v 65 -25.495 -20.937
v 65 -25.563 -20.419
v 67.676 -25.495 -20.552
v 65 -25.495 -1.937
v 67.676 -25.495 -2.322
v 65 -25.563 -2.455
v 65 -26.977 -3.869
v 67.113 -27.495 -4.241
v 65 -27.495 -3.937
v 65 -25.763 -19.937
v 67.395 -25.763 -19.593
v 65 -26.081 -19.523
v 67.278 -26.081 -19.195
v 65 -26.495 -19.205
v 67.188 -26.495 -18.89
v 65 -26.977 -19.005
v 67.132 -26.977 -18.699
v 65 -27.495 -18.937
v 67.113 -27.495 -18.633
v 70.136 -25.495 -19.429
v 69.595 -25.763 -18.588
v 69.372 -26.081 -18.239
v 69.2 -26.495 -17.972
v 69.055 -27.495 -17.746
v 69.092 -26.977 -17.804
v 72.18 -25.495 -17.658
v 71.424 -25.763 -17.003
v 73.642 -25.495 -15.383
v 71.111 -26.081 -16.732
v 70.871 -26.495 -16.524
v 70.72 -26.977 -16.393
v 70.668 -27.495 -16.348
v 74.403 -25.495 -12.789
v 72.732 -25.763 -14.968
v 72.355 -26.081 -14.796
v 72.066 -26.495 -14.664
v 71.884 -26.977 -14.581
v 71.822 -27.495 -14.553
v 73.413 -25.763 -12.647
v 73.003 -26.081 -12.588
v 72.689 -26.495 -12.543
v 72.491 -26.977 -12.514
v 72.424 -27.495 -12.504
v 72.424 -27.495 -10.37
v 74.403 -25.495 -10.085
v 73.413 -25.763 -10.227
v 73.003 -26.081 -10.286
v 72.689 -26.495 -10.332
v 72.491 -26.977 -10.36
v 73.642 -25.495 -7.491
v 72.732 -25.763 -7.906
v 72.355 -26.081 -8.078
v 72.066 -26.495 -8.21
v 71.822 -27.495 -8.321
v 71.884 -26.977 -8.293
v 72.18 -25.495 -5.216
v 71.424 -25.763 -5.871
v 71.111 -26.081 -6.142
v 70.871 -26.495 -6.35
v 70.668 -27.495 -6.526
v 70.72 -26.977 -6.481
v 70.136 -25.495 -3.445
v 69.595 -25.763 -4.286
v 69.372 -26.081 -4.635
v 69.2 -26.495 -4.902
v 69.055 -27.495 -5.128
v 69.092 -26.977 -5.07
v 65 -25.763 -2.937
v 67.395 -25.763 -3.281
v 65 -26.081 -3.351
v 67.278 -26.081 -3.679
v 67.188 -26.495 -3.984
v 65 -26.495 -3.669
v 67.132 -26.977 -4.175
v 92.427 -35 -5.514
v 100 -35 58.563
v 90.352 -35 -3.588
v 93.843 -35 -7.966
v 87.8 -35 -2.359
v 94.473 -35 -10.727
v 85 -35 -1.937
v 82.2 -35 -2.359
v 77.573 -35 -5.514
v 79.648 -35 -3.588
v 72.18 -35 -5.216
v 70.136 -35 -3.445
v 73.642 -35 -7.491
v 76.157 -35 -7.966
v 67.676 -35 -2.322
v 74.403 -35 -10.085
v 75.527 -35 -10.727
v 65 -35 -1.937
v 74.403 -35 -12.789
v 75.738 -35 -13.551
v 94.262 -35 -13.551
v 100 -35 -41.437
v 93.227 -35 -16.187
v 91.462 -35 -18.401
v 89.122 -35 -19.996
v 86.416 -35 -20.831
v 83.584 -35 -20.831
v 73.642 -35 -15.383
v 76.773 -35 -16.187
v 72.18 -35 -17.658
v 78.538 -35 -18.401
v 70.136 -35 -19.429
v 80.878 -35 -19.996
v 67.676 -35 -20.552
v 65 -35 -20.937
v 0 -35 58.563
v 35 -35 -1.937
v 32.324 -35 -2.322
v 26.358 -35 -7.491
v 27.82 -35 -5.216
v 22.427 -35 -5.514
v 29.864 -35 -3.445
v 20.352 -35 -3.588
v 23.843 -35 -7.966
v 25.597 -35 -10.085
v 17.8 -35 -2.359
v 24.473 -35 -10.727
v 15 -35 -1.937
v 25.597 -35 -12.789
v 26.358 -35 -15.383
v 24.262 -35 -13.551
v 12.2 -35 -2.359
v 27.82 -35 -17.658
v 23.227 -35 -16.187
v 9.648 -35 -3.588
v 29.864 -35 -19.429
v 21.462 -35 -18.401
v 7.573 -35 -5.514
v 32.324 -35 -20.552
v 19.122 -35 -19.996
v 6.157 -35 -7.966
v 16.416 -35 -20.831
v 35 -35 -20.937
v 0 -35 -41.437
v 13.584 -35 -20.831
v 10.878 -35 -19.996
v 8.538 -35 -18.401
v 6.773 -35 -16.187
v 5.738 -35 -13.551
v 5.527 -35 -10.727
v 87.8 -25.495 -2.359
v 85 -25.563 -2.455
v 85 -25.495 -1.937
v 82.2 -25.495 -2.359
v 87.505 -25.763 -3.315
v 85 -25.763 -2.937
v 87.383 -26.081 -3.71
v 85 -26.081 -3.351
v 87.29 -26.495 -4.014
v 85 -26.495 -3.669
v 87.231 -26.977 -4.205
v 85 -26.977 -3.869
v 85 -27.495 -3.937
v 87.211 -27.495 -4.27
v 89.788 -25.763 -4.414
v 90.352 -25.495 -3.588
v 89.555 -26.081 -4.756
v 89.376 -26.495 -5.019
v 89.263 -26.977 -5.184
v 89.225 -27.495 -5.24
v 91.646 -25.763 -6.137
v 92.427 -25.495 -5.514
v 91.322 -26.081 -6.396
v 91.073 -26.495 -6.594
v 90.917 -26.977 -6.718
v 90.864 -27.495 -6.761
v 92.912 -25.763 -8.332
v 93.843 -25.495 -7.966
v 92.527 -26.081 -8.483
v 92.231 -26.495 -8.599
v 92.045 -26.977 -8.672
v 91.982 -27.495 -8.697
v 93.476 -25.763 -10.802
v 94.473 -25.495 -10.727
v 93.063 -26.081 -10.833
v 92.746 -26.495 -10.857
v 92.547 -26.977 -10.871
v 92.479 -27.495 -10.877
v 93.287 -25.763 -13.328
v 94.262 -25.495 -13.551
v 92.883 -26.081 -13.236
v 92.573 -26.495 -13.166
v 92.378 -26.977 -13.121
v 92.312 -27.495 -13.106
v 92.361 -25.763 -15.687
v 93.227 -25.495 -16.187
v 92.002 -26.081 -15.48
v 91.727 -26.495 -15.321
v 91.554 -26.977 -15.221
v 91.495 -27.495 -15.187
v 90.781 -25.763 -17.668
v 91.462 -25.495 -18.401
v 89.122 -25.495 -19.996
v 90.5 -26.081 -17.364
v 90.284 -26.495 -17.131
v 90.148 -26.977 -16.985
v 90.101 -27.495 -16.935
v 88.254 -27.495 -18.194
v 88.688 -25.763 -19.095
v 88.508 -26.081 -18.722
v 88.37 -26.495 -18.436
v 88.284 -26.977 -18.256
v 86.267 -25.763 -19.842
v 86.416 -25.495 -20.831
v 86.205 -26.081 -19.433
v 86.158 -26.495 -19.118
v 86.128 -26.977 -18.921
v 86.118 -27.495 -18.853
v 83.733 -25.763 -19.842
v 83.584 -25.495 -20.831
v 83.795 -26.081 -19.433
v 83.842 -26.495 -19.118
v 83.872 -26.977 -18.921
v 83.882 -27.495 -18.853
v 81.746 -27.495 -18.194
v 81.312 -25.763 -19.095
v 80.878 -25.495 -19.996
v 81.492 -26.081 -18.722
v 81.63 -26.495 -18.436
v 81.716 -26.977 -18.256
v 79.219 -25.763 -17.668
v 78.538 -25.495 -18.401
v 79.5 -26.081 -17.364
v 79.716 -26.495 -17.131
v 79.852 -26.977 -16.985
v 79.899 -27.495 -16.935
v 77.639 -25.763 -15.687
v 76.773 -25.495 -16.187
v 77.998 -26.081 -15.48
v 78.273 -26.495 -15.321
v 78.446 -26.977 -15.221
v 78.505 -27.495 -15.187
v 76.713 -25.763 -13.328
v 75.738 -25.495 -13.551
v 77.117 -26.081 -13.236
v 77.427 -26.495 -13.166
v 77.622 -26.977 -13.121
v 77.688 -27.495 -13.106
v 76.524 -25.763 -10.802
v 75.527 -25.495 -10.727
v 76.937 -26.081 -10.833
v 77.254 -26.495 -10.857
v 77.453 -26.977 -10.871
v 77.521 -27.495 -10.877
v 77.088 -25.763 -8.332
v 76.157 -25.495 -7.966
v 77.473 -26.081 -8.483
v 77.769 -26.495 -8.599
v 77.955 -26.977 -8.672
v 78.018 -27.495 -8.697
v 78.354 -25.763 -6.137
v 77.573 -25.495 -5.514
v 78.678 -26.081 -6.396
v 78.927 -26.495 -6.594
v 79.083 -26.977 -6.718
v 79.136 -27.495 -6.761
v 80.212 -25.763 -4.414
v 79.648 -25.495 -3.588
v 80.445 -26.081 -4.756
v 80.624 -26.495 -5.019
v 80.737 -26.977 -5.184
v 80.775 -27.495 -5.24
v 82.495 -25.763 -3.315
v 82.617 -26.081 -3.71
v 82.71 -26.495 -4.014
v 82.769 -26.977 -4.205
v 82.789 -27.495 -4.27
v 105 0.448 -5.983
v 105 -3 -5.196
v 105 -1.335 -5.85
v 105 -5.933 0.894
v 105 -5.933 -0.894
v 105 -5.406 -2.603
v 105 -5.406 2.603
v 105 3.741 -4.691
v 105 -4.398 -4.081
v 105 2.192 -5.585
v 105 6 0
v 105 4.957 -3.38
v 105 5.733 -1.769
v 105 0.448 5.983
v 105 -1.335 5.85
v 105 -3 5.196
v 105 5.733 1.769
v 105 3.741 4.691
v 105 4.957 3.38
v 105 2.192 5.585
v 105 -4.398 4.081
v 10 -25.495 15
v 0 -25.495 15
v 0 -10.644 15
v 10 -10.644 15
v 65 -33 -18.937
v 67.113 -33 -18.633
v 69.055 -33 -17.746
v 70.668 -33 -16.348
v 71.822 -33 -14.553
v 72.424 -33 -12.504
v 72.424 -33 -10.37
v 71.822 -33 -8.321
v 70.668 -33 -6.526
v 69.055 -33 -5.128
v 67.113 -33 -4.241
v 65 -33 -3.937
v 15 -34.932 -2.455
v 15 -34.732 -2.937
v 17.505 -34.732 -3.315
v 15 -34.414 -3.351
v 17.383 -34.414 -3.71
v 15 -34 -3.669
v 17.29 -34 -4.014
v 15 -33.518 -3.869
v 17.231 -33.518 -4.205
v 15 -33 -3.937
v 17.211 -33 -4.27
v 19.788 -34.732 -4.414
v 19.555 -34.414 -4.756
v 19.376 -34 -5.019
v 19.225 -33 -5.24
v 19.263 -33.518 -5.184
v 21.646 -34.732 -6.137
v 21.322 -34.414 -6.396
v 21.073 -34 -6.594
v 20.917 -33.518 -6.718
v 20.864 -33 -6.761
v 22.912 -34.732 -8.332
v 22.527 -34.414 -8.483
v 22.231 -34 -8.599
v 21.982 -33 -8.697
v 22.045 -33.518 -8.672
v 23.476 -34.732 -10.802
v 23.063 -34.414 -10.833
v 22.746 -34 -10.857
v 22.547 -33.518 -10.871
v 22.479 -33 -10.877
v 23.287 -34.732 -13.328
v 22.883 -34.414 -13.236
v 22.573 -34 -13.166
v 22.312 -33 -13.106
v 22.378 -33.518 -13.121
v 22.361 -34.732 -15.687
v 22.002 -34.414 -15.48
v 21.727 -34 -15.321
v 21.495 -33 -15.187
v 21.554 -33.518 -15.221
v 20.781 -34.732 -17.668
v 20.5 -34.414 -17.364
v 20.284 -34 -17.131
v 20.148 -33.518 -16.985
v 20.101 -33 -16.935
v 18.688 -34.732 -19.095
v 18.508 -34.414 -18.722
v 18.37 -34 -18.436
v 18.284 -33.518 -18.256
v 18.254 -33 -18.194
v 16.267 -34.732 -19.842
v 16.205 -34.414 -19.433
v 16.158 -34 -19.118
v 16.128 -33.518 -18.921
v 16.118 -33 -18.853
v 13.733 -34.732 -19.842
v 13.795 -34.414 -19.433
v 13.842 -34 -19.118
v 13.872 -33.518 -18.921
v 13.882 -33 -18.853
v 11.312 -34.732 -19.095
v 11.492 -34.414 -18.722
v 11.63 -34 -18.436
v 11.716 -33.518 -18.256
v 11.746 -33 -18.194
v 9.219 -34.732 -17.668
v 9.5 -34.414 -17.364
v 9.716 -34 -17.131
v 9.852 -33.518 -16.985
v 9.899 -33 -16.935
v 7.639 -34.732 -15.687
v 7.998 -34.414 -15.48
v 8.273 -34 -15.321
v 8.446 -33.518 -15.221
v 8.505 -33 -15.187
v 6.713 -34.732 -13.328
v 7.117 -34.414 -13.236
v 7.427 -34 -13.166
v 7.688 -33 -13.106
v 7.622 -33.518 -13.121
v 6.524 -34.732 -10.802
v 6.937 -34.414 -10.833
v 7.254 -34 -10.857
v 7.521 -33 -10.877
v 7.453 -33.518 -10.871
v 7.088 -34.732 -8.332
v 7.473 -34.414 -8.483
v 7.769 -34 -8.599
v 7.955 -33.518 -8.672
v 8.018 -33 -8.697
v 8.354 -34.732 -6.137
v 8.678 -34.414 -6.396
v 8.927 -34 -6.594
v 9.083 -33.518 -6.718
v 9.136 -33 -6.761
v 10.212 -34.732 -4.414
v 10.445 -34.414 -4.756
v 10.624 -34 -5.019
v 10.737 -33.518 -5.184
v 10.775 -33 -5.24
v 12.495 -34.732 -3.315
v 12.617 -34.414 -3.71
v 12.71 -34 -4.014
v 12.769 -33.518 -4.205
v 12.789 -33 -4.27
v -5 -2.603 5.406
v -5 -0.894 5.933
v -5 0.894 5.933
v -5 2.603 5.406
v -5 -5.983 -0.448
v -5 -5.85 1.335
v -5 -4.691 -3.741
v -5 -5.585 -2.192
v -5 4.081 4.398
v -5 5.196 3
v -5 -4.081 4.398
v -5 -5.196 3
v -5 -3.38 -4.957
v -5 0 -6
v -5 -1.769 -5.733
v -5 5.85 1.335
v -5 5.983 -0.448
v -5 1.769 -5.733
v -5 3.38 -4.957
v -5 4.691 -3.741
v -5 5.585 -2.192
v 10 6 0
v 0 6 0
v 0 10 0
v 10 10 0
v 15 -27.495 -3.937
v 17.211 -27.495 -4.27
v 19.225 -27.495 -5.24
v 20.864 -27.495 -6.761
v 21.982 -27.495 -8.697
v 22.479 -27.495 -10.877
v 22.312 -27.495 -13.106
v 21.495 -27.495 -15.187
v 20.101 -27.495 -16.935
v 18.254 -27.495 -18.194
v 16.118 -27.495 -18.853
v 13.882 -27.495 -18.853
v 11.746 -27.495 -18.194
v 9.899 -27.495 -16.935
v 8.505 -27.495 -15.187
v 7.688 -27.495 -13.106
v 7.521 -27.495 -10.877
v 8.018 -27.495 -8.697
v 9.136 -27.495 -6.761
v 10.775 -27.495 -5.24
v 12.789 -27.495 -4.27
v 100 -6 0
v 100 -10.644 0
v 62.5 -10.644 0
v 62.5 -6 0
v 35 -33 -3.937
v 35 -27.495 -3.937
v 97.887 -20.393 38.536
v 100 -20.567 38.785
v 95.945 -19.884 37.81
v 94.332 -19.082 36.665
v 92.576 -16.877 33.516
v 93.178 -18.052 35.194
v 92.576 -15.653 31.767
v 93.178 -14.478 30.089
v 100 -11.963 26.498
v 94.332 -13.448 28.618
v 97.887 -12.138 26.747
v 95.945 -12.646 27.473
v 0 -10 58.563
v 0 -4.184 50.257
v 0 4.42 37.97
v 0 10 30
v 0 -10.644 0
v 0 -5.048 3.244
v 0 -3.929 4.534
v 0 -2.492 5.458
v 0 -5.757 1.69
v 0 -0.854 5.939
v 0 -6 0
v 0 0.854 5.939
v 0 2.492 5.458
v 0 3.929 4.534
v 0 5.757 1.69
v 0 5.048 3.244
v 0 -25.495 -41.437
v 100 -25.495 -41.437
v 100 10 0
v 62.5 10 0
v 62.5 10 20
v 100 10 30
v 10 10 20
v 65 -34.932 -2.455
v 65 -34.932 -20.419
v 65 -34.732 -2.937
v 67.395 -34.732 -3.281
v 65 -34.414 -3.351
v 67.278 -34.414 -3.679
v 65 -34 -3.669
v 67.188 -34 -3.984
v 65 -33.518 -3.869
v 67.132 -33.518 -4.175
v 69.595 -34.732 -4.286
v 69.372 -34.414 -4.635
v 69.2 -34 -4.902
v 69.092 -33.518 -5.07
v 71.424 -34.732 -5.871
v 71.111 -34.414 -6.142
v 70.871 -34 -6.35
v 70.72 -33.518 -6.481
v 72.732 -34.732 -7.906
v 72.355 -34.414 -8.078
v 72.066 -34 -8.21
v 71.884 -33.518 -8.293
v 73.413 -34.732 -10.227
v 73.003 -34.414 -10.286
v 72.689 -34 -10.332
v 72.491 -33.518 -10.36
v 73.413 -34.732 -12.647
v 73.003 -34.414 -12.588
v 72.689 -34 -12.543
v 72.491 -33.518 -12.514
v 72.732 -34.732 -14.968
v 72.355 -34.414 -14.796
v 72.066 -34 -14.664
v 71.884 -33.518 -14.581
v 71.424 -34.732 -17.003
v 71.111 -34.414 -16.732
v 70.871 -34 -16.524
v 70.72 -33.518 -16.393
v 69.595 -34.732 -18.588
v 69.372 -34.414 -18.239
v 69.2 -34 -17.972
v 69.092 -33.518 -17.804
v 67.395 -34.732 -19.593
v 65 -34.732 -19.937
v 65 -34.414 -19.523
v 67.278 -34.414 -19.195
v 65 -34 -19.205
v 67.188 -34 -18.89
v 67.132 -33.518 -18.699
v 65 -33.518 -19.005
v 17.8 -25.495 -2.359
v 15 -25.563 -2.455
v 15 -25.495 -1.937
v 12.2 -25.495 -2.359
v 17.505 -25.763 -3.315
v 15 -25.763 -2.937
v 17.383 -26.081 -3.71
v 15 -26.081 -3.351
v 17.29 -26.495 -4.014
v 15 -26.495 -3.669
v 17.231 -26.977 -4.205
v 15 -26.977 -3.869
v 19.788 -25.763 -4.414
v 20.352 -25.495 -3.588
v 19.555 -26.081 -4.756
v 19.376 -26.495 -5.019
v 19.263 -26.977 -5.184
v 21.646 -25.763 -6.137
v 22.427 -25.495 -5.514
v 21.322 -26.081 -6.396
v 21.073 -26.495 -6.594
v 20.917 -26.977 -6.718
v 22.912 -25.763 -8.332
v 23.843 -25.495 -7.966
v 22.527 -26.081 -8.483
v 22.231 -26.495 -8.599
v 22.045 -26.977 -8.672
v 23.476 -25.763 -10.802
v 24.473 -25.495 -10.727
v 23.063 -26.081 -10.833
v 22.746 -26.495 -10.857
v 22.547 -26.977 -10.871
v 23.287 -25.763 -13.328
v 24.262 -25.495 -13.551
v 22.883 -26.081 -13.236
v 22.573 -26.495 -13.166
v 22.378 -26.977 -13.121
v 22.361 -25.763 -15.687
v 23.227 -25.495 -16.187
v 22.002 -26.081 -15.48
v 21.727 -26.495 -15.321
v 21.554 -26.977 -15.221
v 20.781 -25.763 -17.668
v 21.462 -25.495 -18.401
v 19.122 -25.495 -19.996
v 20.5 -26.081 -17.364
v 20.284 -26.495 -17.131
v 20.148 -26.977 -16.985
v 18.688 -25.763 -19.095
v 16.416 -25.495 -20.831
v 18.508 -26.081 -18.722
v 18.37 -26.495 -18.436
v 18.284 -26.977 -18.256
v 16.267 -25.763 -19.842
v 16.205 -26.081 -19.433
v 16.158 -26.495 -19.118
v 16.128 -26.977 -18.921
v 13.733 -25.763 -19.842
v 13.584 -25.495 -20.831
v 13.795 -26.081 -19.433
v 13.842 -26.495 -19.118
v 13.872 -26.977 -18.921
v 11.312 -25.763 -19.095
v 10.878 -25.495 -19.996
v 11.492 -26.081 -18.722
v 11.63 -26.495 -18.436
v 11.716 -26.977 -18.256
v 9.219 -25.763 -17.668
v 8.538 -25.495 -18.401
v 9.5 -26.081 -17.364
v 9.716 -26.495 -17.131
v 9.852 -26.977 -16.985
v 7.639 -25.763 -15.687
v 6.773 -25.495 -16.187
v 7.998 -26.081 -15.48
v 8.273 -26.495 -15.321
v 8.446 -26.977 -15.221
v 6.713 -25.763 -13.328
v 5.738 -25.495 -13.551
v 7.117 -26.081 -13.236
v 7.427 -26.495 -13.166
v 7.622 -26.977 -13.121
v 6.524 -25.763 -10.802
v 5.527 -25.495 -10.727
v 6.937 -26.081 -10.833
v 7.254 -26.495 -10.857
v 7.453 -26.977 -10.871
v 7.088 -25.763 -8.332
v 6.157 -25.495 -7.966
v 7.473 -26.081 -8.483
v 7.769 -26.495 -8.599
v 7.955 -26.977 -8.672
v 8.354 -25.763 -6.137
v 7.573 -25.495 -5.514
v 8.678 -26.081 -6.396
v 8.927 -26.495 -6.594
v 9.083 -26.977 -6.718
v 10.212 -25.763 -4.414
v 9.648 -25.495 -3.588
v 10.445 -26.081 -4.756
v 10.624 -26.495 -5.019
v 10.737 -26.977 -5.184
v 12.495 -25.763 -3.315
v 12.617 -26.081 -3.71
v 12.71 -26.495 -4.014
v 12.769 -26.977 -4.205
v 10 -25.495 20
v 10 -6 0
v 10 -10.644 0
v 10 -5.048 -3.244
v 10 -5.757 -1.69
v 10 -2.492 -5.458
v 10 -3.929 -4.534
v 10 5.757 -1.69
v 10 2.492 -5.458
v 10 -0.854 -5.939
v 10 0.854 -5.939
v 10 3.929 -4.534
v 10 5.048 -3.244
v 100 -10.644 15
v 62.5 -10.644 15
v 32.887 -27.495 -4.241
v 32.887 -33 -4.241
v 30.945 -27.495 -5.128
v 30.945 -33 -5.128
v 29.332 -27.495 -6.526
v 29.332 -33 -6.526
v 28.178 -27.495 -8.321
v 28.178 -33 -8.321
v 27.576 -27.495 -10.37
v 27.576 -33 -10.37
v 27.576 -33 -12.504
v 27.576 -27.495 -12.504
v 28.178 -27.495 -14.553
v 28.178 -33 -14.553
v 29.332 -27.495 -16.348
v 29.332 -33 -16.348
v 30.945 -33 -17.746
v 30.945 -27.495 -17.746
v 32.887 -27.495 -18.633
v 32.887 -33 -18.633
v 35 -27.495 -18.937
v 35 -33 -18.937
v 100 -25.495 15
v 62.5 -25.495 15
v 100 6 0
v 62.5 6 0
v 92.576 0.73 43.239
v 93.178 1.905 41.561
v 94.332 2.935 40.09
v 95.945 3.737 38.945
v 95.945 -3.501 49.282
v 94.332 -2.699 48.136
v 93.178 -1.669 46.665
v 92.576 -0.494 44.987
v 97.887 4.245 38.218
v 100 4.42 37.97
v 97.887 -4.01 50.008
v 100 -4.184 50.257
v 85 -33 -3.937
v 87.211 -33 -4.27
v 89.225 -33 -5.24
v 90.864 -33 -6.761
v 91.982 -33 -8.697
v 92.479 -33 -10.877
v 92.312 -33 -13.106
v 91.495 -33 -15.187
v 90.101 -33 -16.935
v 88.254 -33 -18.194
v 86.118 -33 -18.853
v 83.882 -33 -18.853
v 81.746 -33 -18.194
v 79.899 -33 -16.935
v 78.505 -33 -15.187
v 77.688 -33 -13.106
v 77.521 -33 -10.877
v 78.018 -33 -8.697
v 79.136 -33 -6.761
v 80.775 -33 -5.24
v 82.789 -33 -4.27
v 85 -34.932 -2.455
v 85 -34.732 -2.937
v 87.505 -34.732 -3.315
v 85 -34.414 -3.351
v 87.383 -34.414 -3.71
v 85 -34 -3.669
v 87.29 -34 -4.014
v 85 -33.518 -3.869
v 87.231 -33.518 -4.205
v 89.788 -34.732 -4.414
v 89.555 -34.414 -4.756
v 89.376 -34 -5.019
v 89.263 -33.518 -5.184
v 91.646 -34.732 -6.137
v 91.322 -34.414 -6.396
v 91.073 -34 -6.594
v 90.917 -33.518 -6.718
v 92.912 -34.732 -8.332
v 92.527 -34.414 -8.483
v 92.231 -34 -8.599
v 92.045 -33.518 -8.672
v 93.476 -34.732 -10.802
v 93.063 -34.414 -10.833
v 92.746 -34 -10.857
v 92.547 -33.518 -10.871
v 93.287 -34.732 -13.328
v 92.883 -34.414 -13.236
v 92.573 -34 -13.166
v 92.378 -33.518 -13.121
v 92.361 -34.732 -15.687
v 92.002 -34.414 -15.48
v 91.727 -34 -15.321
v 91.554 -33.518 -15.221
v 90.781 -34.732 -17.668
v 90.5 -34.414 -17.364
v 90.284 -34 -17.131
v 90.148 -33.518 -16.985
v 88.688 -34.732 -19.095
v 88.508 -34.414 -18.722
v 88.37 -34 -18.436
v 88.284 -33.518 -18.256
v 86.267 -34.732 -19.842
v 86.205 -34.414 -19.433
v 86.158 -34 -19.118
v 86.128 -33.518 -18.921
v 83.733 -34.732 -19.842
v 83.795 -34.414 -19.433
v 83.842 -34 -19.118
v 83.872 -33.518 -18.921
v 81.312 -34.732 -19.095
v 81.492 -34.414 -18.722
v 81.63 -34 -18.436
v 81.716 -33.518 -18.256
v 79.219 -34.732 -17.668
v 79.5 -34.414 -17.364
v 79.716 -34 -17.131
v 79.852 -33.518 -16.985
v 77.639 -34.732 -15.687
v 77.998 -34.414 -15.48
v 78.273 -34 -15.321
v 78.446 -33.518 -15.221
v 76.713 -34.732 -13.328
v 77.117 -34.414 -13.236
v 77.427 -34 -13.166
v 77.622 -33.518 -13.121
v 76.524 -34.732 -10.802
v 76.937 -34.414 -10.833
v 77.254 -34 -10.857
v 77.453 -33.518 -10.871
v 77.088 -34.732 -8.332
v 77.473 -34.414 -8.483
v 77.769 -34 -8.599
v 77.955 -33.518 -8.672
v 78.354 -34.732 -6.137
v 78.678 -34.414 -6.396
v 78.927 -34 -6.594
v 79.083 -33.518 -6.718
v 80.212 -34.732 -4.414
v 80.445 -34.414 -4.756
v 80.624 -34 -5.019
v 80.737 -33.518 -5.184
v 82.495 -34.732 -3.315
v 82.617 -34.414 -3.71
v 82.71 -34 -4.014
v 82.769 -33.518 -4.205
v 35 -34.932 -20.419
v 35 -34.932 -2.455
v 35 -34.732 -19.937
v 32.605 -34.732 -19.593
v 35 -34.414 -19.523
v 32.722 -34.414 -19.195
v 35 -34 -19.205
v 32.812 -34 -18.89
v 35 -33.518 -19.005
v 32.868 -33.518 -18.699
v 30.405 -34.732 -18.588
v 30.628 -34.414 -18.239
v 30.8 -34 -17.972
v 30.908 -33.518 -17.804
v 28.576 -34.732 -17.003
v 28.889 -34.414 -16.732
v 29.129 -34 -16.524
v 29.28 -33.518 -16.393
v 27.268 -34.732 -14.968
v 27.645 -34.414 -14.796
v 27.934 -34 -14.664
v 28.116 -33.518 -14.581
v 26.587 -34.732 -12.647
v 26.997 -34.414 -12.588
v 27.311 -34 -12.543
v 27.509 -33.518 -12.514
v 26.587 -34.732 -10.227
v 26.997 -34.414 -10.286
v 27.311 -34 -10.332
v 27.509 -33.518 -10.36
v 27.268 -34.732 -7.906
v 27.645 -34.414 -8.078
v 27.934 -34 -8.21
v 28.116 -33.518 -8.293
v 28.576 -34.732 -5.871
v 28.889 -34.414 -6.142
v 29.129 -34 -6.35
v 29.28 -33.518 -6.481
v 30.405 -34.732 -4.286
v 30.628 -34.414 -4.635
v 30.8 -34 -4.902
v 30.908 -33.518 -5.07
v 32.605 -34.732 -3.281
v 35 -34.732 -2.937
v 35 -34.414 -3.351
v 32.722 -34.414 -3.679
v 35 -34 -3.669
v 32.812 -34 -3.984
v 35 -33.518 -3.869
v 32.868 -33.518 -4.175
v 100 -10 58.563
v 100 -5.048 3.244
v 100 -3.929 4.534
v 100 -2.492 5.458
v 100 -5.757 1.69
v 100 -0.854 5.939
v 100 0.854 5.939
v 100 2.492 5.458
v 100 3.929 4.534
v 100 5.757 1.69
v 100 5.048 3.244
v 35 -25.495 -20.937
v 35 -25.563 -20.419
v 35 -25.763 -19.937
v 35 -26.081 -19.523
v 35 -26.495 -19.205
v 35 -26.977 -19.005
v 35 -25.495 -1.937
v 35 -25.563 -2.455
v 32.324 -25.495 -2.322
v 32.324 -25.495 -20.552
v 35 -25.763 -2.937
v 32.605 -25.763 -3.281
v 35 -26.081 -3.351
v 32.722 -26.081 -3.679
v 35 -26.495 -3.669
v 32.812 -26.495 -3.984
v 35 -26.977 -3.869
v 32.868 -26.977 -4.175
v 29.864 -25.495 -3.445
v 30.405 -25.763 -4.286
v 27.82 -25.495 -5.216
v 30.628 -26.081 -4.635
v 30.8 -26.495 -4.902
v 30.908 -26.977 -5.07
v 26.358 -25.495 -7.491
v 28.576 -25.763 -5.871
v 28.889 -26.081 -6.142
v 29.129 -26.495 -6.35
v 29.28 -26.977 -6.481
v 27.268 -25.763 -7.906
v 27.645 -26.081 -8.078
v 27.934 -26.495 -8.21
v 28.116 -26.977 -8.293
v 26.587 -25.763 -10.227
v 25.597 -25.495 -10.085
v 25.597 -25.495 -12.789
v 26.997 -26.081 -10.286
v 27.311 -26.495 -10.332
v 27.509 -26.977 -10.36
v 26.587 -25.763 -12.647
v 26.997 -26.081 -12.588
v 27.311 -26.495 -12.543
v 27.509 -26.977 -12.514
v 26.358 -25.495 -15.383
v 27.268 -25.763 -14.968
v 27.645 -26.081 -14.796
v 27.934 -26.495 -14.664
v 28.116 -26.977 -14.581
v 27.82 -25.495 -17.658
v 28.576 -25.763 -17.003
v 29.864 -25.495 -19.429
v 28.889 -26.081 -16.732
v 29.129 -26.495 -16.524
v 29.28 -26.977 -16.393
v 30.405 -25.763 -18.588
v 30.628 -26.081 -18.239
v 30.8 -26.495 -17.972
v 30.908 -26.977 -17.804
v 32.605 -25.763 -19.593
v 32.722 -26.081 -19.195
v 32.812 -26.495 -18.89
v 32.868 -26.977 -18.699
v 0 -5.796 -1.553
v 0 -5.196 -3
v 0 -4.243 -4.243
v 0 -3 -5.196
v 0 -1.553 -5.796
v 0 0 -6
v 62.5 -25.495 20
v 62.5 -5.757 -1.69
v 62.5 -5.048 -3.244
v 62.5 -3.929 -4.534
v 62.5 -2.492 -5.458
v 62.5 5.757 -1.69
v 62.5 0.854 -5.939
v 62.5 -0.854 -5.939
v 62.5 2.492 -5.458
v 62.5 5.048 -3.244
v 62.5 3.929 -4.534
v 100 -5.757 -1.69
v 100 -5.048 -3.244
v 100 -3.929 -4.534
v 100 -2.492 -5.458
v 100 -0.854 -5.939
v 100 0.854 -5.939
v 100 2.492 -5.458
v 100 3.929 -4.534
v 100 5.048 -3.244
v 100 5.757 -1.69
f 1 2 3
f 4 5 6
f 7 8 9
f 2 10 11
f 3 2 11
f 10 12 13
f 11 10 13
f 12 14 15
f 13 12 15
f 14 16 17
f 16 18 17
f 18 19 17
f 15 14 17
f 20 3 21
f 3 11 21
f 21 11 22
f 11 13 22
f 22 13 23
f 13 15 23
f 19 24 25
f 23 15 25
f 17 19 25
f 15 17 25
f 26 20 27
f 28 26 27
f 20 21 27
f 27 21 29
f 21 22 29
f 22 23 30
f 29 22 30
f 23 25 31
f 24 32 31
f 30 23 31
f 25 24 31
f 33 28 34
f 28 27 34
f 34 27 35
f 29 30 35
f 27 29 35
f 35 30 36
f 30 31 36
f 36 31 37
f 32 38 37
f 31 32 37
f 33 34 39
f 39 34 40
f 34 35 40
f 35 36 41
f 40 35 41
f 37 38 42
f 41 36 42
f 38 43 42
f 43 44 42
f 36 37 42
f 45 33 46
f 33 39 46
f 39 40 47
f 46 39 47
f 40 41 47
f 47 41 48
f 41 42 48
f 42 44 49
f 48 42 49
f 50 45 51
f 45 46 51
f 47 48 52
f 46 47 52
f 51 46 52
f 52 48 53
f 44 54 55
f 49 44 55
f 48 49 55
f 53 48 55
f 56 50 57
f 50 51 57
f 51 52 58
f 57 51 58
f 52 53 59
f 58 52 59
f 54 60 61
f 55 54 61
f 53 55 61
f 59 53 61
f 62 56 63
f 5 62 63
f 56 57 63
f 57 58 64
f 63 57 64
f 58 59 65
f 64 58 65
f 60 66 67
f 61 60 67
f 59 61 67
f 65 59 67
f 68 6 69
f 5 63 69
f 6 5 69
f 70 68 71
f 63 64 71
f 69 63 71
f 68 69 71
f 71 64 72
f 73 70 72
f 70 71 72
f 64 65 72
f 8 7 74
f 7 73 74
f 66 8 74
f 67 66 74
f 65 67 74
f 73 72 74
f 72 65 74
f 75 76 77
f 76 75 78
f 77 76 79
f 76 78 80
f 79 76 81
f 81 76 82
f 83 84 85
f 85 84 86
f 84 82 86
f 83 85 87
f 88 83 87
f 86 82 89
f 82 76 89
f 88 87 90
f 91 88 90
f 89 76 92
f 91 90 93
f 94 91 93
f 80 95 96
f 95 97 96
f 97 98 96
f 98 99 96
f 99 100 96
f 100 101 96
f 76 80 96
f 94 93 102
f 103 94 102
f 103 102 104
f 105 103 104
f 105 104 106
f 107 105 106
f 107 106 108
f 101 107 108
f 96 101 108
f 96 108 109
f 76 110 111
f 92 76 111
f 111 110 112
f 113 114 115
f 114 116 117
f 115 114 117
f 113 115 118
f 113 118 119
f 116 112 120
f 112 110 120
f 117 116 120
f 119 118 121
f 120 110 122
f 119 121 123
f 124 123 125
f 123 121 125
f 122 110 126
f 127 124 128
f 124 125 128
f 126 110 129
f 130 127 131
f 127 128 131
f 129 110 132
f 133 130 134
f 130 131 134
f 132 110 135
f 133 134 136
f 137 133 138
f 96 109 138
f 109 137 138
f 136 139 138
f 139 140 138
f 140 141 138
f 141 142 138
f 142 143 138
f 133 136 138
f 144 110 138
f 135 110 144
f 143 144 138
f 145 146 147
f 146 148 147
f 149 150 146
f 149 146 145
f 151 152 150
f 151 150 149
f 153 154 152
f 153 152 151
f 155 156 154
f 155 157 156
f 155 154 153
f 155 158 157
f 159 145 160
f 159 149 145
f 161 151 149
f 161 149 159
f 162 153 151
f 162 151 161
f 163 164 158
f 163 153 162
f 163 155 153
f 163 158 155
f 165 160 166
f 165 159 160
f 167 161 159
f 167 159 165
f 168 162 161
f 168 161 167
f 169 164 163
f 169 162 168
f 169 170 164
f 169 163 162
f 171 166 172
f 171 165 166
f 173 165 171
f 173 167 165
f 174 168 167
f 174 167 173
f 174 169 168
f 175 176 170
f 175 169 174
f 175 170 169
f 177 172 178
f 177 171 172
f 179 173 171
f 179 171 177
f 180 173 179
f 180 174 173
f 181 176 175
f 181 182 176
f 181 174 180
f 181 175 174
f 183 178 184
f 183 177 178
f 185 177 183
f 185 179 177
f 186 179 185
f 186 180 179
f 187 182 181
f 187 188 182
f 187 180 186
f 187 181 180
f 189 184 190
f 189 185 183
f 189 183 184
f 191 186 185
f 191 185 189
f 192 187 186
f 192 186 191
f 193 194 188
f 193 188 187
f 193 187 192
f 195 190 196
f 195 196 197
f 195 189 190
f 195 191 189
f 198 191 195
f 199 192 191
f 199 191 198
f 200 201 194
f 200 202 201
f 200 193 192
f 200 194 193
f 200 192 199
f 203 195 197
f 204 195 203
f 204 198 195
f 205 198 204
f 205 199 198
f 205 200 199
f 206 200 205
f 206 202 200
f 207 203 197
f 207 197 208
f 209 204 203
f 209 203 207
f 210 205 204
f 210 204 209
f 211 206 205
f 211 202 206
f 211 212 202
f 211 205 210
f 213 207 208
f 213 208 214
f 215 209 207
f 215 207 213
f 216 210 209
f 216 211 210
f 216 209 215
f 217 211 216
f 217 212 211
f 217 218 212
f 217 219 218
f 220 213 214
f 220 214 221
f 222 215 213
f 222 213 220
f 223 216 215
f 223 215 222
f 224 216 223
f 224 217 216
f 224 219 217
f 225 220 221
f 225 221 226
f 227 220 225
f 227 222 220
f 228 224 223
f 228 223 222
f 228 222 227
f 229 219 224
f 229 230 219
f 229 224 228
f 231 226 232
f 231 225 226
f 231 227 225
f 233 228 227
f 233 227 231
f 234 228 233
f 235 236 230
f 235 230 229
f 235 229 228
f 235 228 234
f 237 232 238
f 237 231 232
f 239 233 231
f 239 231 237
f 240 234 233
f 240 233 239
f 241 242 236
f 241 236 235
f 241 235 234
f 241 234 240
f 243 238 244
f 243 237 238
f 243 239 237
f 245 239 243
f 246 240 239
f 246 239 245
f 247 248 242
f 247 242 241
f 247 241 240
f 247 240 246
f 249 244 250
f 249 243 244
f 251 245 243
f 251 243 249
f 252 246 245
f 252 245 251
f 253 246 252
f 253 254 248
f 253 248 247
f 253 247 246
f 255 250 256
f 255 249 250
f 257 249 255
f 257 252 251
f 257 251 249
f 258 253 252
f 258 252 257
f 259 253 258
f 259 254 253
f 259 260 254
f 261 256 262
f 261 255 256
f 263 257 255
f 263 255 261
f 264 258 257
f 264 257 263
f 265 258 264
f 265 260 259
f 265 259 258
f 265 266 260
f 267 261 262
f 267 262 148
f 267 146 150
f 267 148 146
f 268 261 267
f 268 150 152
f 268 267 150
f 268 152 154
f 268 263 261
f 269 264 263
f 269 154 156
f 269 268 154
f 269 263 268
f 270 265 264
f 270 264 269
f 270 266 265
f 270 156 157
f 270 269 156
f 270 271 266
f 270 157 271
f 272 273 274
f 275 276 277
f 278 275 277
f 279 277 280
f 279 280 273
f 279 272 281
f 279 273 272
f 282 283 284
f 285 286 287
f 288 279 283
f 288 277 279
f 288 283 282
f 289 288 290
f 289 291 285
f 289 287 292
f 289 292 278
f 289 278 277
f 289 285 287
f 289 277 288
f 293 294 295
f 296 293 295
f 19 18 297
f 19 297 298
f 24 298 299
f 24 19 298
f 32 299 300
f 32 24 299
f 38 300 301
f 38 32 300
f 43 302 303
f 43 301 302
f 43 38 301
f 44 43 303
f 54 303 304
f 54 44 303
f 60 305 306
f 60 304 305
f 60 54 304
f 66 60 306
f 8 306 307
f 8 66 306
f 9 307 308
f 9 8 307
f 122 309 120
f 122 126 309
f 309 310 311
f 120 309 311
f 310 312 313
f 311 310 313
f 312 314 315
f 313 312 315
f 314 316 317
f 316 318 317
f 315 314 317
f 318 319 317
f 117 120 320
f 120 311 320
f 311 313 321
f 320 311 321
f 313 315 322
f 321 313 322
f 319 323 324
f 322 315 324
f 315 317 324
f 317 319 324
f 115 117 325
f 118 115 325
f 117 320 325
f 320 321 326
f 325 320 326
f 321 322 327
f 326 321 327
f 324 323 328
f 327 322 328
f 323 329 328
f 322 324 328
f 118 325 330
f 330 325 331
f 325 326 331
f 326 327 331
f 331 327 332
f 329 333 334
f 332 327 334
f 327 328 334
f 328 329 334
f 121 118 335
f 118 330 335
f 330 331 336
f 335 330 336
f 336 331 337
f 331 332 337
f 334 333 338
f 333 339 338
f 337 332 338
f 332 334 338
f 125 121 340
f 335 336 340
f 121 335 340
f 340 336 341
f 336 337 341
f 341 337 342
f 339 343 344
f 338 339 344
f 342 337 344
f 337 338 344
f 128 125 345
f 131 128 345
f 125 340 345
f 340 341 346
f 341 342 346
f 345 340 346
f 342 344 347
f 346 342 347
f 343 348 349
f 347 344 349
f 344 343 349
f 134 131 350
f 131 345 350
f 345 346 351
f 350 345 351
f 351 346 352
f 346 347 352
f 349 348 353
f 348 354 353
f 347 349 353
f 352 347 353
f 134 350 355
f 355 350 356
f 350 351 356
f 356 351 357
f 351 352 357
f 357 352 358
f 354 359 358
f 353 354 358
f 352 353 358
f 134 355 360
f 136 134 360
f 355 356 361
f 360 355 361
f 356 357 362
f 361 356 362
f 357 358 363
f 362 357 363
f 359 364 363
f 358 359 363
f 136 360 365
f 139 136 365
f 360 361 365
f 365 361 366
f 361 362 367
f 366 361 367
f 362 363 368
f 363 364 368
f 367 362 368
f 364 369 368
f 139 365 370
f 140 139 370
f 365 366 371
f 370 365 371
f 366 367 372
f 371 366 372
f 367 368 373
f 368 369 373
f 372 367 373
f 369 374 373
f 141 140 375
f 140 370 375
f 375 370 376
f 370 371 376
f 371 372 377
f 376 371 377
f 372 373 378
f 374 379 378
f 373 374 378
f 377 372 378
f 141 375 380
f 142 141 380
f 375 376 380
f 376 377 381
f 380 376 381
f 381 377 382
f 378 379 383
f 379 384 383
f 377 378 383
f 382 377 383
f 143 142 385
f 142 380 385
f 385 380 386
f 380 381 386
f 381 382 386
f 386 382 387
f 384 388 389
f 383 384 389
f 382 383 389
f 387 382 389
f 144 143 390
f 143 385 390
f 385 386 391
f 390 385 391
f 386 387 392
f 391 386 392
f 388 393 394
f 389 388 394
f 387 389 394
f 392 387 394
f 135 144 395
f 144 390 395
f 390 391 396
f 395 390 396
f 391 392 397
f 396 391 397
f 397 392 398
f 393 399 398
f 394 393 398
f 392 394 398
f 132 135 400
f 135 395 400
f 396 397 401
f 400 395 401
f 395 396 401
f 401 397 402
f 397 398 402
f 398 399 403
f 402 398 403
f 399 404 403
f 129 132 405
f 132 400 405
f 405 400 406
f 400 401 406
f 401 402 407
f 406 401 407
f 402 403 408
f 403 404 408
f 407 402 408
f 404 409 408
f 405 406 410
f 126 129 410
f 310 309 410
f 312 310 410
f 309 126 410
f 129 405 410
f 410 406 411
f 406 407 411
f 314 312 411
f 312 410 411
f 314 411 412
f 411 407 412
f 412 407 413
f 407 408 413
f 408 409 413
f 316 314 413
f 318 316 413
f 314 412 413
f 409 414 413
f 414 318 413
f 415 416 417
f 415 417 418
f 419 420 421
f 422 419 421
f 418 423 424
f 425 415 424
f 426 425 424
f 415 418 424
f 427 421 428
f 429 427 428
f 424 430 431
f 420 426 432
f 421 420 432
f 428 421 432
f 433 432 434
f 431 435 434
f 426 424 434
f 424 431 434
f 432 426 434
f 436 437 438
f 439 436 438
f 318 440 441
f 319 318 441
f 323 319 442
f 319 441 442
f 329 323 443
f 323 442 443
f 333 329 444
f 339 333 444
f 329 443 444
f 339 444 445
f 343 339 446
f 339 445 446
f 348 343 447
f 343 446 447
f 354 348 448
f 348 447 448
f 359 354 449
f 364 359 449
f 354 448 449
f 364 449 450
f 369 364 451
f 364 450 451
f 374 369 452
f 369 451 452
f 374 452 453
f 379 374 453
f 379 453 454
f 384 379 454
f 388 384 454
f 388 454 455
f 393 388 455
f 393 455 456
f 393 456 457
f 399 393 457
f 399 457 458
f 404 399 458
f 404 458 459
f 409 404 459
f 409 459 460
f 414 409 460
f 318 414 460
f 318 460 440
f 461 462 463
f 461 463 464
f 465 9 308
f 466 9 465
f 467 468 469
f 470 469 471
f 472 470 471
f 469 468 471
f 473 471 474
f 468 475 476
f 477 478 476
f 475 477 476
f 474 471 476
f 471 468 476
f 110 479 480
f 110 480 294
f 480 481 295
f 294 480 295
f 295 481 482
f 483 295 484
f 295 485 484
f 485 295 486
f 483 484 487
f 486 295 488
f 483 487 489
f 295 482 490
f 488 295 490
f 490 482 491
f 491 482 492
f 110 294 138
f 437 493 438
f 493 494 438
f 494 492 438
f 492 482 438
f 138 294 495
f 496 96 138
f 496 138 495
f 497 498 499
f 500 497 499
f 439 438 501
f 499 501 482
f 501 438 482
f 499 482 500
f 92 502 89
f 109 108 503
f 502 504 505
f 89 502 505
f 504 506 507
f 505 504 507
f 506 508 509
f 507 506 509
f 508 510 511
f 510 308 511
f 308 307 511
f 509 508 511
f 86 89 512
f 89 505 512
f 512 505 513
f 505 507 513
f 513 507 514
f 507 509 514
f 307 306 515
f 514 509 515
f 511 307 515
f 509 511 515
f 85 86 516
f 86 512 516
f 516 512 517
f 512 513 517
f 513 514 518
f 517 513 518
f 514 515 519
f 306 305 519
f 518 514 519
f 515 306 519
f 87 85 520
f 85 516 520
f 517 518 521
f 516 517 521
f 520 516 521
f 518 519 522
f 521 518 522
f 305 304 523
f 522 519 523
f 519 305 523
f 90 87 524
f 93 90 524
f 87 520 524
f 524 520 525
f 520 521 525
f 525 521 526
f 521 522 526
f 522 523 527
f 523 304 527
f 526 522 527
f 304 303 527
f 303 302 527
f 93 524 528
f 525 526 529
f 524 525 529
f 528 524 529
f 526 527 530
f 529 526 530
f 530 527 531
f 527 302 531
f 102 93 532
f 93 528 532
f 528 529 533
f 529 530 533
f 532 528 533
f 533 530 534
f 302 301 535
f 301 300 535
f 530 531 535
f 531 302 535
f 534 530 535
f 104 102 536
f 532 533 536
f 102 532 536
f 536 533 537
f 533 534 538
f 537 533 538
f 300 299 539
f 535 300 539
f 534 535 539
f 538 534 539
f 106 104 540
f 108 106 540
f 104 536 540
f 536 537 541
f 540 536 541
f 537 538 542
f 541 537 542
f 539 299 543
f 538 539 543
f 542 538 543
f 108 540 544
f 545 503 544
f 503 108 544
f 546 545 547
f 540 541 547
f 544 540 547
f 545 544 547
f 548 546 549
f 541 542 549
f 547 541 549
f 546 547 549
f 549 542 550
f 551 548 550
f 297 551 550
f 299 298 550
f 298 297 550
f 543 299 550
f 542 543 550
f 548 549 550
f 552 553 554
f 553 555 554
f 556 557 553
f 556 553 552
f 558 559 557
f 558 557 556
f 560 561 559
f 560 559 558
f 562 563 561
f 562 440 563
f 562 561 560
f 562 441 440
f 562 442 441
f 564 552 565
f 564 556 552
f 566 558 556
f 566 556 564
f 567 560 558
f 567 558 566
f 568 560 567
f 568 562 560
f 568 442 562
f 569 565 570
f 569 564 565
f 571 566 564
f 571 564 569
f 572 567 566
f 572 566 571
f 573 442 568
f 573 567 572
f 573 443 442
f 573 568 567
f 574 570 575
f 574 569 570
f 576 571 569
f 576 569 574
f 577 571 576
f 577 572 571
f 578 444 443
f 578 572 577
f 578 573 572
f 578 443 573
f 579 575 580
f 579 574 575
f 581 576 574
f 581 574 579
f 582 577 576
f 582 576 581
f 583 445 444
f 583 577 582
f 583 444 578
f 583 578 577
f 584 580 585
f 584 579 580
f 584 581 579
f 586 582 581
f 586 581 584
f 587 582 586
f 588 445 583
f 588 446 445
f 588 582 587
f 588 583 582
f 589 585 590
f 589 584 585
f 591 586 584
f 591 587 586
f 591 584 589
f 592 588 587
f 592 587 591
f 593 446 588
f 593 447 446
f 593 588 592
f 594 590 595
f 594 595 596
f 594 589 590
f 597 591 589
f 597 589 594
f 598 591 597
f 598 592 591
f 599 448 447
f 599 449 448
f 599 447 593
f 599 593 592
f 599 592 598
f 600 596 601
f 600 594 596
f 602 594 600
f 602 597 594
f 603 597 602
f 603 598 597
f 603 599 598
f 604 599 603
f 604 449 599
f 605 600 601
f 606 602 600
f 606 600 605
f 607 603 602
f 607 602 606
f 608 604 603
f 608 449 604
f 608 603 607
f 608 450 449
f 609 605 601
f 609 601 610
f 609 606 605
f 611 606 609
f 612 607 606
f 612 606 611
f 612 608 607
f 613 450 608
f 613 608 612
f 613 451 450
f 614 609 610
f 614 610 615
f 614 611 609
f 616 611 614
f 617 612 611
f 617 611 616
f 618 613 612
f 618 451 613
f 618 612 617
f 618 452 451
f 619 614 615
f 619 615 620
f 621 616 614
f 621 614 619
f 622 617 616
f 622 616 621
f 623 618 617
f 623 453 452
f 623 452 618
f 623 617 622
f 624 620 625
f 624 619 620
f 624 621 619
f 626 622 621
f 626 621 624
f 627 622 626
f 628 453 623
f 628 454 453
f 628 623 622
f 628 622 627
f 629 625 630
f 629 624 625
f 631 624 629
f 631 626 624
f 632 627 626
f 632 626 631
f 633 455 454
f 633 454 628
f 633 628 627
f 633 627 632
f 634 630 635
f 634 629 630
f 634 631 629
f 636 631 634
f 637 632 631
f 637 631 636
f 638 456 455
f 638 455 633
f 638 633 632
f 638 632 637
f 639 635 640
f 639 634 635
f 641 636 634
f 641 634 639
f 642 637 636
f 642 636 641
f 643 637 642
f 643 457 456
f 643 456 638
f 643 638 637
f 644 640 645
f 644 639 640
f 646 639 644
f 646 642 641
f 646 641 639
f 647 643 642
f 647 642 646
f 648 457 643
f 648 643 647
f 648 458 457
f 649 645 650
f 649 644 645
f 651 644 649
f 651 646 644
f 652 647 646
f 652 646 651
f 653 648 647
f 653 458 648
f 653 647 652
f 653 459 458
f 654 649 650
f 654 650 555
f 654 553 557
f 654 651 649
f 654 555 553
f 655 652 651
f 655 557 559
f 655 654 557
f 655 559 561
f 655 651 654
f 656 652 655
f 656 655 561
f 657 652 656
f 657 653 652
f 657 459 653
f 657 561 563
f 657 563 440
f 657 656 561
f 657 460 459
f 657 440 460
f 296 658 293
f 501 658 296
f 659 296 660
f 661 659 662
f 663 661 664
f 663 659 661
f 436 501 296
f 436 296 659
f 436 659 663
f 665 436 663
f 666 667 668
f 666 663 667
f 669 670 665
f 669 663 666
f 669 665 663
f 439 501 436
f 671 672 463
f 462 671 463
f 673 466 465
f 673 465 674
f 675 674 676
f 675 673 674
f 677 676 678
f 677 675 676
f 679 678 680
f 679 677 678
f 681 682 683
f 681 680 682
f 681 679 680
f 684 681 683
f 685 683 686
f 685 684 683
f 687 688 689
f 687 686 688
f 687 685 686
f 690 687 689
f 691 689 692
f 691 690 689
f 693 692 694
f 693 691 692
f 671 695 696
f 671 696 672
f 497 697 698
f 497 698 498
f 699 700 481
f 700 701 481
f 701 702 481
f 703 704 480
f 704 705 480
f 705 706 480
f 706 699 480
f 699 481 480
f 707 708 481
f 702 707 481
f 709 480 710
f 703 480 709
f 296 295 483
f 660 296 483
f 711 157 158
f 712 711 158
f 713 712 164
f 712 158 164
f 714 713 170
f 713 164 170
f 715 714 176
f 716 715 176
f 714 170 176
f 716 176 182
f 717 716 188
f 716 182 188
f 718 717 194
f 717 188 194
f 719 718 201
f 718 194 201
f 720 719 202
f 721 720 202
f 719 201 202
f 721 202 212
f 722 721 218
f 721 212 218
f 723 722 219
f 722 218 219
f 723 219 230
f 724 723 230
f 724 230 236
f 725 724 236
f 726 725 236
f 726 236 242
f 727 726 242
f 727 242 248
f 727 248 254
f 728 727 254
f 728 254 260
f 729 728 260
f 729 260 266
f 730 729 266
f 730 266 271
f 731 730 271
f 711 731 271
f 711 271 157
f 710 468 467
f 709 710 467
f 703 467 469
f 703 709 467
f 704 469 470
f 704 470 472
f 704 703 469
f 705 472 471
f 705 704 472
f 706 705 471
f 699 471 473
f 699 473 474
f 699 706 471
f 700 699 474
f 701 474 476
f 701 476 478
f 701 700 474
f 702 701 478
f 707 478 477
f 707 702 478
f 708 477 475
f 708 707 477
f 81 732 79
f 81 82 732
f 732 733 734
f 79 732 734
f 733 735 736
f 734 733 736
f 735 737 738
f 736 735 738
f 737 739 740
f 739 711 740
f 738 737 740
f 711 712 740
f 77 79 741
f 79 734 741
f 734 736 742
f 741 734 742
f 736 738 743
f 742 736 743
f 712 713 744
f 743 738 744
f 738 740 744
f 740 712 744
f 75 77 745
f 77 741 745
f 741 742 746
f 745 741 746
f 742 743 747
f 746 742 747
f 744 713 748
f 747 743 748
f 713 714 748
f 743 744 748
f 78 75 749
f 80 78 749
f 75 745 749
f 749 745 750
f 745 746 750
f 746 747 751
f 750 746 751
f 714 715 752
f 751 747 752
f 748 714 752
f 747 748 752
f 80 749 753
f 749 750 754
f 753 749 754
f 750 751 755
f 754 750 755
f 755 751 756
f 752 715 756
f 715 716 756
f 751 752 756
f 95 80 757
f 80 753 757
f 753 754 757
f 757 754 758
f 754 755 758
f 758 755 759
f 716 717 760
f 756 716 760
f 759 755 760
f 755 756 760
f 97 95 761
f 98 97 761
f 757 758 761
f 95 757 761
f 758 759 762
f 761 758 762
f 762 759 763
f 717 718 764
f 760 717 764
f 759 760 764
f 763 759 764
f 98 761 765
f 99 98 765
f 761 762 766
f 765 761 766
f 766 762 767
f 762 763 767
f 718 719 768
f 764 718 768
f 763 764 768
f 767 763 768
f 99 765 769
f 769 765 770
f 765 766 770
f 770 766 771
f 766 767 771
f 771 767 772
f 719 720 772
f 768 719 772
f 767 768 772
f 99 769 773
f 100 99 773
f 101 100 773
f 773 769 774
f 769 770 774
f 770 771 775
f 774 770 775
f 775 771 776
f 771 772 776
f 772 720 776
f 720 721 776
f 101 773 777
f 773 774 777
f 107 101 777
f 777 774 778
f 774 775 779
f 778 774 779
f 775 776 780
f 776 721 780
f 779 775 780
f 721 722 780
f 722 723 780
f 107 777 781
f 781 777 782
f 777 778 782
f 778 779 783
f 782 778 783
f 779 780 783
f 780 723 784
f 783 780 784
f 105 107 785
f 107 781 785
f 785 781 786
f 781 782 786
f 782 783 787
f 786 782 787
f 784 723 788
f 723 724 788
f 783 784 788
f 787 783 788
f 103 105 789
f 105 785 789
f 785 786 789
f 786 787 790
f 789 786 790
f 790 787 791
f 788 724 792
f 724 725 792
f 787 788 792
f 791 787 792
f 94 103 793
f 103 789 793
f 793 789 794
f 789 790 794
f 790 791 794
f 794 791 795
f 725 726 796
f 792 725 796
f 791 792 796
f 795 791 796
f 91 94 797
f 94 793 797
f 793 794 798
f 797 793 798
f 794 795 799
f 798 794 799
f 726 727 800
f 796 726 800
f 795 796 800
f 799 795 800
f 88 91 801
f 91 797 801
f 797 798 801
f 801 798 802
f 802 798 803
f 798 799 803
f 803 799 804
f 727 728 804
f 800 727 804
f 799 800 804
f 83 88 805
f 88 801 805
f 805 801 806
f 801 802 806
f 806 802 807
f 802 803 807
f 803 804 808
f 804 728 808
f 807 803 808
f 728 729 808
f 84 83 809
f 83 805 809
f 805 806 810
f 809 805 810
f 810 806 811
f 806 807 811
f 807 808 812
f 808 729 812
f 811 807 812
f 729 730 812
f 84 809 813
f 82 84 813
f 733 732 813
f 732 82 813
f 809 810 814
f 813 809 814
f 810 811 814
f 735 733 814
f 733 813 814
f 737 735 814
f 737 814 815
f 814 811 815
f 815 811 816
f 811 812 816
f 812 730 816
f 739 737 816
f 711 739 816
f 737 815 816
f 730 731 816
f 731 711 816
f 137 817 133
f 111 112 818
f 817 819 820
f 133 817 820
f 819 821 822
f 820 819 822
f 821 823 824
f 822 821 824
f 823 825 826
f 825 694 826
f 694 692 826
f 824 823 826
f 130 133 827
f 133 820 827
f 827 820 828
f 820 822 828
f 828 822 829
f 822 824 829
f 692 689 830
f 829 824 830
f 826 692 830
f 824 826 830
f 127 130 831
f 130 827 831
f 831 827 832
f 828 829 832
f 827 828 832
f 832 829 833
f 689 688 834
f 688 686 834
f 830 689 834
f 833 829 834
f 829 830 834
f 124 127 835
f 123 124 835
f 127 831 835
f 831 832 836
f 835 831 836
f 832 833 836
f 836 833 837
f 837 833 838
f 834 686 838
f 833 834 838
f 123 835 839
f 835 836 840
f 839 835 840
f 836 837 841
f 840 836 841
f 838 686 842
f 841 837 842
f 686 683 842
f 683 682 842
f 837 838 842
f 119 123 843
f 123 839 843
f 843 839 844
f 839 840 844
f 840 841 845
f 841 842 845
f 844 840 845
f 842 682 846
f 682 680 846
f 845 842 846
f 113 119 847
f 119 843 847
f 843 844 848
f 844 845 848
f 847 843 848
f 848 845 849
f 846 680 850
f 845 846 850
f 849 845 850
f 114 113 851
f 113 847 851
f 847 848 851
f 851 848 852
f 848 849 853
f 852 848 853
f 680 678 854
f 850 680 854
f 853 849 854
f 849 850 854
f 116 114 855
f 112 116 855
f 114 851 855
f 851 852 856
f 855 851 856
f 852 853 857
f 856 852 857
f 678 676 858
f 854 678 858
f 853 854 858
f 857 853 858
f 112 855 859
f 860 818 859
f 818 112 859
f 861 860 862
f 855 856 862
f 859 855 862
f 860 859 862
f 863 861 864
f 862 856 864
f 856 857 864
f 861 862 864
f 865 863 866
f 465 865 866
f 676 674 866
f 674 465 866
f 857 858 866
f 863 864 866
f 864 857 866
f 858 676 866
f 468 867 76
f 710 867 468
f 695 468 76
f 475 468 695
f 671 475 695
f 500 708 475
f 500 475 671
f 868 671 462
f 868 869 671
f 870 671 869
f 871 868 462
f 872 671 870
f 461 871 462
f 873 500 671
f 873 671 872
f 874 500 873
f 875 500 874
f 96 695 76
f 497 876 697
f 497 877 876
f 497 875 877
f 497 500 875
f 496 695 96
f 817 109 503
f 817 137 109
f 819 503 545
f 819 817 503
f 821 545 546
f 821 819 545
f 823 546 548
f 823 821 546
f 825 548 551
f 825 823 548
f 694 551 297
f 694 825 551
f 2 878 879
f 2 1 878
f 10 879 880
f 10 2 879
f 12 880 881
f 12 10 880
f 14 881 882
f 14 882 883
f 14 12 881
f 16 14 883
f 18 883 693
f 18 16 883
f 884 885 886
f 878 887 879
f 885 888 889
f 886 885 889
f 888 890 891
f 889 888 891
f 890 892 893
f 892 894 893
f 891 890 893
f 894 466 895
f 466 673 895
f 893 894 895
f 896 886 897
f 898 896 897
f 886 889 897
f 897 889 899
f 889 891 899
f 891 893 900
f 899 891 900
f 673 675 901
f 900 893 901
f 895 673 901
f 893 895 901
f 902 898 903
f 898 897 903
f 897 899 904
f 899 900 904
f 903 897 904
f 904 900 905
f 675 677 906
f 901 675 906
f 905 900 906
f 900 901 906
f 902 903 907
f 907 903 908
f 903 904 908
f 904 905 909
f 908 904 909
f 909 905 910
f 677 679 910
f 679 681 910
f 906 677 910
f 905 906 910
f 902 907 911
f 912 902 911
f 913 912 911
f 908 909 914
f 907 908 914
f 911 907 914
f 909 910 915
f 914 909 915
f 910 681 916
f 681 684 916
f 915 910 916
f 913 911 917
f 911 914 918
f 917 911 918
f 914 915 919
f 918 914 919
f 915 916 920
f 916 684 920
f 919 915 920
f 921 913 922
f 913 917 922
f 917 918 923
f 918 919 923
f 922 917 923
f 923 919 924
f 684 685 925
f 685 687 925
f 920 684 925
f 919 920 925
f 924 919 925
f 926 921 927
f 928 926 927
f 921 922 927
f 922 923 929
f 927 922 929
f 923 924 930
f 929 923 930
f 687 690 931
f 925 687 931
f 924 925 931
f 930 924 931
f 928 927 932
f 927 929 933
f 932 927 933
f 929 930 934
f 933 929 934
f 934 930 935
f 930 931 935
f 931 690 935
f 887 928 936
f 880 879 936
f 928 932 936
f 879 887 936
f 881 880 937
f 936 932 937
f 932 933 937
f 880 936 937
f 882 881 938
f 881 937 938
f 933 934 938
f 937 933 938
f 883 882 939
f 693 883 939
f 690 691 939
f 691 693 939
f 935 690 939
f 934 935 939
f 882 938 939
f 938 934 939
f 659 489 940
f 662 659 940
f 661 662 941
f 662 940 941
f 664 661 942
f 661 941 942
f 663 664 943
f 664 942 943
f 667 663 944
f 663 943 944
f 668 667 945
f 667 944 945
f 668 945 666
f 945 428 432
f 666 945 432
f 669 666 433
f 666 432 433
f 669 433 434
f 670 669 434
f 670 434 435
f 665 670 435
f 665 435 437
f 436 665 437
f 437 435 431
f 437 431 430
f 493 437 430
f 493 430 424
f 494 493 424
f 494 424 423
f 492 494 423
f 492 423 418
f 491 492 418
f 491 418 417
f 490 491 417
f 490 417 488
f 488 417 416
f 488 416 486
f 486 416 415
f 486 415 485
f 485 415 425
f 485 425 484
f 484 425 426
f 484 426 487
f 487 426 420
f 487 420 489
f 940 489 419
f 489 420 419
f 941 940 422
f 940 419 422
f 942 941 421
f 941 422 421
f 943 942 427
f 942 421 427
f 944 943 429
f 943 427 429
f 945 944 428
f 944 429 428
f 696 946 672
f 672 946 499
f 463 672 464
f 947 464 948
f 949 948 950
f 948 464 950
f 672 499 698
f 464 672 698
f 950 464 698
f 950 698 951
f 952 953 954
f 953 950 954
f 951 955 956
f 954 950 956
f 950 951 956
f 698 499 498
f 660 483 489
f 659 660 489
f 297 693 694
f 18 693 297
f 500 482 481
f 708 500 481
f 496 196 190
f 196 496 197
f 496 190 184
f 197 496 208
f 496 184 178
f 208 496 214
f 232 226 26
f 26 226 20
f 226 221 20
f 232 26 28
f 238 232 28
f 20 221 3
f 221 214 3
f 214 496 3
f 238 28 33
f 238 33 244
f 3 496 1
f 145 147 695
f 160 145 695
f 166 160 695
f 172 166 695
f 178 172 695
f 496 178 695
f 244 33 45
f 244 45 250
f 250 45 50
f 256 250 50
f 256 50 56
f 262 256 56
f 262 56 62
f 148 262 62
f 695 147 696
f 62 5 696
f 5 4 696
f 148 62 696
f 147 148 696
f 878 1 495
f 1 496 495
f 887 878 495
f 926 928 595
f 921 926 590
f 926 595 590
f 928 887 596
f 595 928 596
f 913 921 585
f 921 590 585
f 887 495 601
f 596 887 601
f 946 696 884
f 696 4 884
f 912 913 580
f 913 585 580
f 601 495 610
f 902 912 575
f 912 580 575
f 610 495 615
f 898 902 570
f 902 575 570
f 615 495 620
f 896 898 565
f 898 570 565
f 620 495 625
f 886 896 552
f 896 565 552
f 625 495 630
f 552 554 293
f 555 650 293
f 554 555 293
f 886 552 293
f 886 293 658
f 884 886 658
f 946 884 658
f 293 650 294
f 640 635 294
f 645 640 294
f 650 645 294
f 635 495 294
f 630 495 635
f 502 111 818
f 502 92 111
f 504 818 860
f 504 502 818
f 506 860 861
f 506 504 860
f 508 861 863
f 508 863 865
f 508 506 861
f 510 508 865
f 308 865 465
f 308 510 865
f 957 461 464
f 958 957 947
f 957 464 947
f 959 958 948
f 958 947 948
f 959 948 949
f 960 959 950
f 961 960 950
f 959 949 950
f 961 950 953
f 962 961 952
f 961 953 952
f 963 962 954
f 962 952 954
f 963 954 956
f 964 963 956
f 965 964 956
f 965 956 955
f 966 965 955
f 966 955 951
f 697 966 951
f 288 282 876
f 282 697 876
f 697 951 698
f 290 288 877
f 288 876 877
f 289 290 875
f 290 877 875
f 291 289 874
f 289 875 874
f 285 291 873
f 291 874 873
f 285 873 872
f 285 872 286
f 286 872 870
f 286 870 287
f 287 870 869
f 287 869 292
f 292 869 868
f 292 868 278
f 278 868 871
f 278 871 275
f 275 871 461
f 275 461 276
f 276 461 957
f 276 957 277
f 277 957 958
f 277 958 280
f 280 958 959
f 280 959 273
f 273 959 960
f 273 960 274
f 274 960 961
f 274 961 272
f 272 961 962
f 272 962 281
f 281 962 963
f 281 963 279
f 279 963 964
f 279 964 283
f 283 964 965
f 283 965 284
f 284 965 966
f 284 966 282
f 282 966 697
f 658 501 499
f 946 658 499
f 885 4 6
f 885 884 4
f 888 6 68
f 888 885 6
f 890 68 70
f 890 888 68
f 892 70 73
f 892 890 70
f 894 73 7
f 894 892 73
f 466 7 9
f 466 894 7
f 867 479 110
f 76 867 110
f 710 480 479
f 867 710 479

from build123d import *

# Parameters (mm, degrees)
SKETCH3_R           = 6
BOSS_EXTRUDE1_DEPTH = 100
BOSS_EXTRUDE2_START = 100
SKETCH3_3_R         = 6
BOSS_EXTRUDE2_DEPTH = 5
BOSS_EXTRUDE3_START = -5
SKETCH3_4_R         = 6
BOSS_EXTRUDE3_DEPTH = 5
CUT_EXTRUDE2_REACH  = 130.373
SKETCH4_W           = 52.5
SKETCH4_H           = 26
CUT_EXTRUDE3_DEPTH  = 20
SKETCH6_R           = 7.5
CUT_EXTRUDE4_DEPTH  = 126.357563949
FILLET1_R           = 2


with BuildPart() as part:
    # Sketch3 → Boss-Extrude1 (new body)
    with BuildSketch(Plane(origin=(0, 0, 0), x_dir=(0, 0, -1), z_dir=(1, 0, 0))):
        with BuildLine():
            Line((-58.562960135, -10), (-58.562960135, -35))
            Line((-58.562960135, -35), (41.437039865, -35))
            Line((41.437039865, -35), (41.437039865, -25.495049505))
            Line((41.437039865, -25.495049505), (-15, -25.495049505))
            Line((-15, -25.495049505), (-15, -10.643564356))
            Line((-15, -10.643564356), (0, -10.643564356))
            Line((0, -10.643564356), (0, -6))
            ThreePointArc((0, -6), (-6, 0), (0, 6))
            Line((0, 6), (0, 10))
            Line((0, 10), (-30, 10))
            Line((-30, 10), (-37.969507388, 4.419690851))
            Line((-37.969507388, 4.419690851), (-26.497978661, -11.963350035))
            Line((-26.497978661, -11.963350035), (-38.785259325, -20.56699658))
            Line((-38.785259325, -20.56699658), (-50.256788052, -4.183955694))
            Line((-50.256788052, -4.183955694), (-58.562960135, -10))
        make_face()
        Polygon((-37.969507388, 4.419690851), (-50.256788052, -4.183955694), (-38.785259325, -20.56699658), (-26.497978661, -11.963350035), align=None)
        Circle(SKETCH3_R)
    extrude(amount=BOSS_EXTRUDE1_DEPTH)

    # Sketch3<3> → Boss-Extrude2 (add)
    with BuildSketch(Plane(origin=(0, 0, 0), x_dir=(0, 0, -1), z_dir=(1, 0, 0)).offset(BOSS_EXTRUDE2_START)):
        with Locations(Location((0, 0, 0), (0, 0, 90))):
            Circle(SKETCH3_3_R)
    extrude(amount=BOSS_EXTRUDE2_DEPTH)

    # Sketch3<4> → Boss-Extrude3 (add)
    with BuildSketch(Plane(origin=(0, 0, 0), x_dir=(0, 0, -1), z_dir=(1, 0, 0)).offset(BOSS_EXTRUDE3_START)):
        Circle(SKETCH3_4_R)
    extrude(amount=BOSS_EXTRUDE3_DEPTH)

    # Cut-Extrude2: up to this face of the body (flat: up to its plane)
    cut_extrude2_end = Plane(part.part.faces().sort_by_distance((50, -25.495049505, -13.218519933))[0])
    # Sketch4 → Cut-Extrude2 (cut, up to the picked face)
    with BuildSketch(Plane(origin=(0, 10, 0), x_dir=(1, 0, 0), z_dir=(0, 1, 0)), mode=Mode.PRIVATE) as cut_extrude2_sk1:
        with Locations((36.25, -7)):
            Rectangle(SKETCH4_W, SKETCH4_H)
    cut_extrude2_tool1 = split(extrude(cut_extrude2_sk1.sketch, amount=-CUT_EXTRUDE2_REACH, mode=Mode.PRIVATE), bisect_by=cut_extrude2_end, keep=Keep.BOTH, mode=Mode.PRIVATE)
    add(cut_extrude2_tool1.solids().sort_by(Axis((36.25, 10, 7), (0, -1, 0)))[0], mode=Mode.SUBTRACT)

    # Sketch5 → Cut-Extrude3 (cut)
    with BuildSketch(Plane(origin=(0, 20.805490028, 14.568160954), x_dir=(1, 0, 0), z_dir=(0, 0.8191520442889929, 0.5735764363510445))):
        with BuildLine():
            Line((100, -28.56776907), (100, -43.56776907))
            ThreePointArc((100, -43.56776907), (92.5, -36.06776907), (100, -28.56776907))
        make_face()
    extrude(amount=-CUT_EXTRUDE3_DEPTH, mode=Mode.SUBTRACT)

    # Sketch6 → Cut-Extrude4 (cut, through all)
    with BuildSketch(Plane(origin=(0, -25.495049505, 0), x_dir=(1, 0, 0), z_dir=(0, 1, 0))):
        with Locations(Location((15, 11.437039865, 0), (0, 0, 270))):
            Circle(SKETCH6_R)
        with Locations(Location((85, 11.437039865, 0), (0, 0, 270))):
            Circle(SKETCH6_R)
        with BuildLine():
            Line((65, 3.937039865), (35, 3.937039865))
            ThreePointArc((35, 3.937039865), (27.5, 11.437039865), (35, 18.937039865))
            Line((35, 18.937039865), (65, 18.937039865))
            ThreePointArc((65, 18.937039865), (72.5, 11.437039865), (65, 3.937039865))
        make_face()
    extrude(amount=-CUT_EXTRUDE4_DEPTH, mode=Mode.SUBTRACT)

    # Fillet1
    fillet1_edges = [part.edges().sort_by_distance(p)[0] for p in [
        (72.5, -35, -11.437039865),
        (50, -35, -3.937039865),
        (27.5, -35, -11.437039865),
        (50, -35, -18.937039865),
        (72.5, -25.495049505, -11.437039865),
        (50, -25.495049505, -18.937039865),
        (27.5, -25.495049505, -11.437039865),
        (50, -25.495049505, -3.937039865),
        (15, -35, -18.937039865),
        (15, -25.495049505, -18.937039865),
        (85, -35, -18.937039865),
        (85, -25.495049505, -18.937039865),
    ]]
    fillet(fillet1_edges, radius=FILLET1_R)


solid = part.part
